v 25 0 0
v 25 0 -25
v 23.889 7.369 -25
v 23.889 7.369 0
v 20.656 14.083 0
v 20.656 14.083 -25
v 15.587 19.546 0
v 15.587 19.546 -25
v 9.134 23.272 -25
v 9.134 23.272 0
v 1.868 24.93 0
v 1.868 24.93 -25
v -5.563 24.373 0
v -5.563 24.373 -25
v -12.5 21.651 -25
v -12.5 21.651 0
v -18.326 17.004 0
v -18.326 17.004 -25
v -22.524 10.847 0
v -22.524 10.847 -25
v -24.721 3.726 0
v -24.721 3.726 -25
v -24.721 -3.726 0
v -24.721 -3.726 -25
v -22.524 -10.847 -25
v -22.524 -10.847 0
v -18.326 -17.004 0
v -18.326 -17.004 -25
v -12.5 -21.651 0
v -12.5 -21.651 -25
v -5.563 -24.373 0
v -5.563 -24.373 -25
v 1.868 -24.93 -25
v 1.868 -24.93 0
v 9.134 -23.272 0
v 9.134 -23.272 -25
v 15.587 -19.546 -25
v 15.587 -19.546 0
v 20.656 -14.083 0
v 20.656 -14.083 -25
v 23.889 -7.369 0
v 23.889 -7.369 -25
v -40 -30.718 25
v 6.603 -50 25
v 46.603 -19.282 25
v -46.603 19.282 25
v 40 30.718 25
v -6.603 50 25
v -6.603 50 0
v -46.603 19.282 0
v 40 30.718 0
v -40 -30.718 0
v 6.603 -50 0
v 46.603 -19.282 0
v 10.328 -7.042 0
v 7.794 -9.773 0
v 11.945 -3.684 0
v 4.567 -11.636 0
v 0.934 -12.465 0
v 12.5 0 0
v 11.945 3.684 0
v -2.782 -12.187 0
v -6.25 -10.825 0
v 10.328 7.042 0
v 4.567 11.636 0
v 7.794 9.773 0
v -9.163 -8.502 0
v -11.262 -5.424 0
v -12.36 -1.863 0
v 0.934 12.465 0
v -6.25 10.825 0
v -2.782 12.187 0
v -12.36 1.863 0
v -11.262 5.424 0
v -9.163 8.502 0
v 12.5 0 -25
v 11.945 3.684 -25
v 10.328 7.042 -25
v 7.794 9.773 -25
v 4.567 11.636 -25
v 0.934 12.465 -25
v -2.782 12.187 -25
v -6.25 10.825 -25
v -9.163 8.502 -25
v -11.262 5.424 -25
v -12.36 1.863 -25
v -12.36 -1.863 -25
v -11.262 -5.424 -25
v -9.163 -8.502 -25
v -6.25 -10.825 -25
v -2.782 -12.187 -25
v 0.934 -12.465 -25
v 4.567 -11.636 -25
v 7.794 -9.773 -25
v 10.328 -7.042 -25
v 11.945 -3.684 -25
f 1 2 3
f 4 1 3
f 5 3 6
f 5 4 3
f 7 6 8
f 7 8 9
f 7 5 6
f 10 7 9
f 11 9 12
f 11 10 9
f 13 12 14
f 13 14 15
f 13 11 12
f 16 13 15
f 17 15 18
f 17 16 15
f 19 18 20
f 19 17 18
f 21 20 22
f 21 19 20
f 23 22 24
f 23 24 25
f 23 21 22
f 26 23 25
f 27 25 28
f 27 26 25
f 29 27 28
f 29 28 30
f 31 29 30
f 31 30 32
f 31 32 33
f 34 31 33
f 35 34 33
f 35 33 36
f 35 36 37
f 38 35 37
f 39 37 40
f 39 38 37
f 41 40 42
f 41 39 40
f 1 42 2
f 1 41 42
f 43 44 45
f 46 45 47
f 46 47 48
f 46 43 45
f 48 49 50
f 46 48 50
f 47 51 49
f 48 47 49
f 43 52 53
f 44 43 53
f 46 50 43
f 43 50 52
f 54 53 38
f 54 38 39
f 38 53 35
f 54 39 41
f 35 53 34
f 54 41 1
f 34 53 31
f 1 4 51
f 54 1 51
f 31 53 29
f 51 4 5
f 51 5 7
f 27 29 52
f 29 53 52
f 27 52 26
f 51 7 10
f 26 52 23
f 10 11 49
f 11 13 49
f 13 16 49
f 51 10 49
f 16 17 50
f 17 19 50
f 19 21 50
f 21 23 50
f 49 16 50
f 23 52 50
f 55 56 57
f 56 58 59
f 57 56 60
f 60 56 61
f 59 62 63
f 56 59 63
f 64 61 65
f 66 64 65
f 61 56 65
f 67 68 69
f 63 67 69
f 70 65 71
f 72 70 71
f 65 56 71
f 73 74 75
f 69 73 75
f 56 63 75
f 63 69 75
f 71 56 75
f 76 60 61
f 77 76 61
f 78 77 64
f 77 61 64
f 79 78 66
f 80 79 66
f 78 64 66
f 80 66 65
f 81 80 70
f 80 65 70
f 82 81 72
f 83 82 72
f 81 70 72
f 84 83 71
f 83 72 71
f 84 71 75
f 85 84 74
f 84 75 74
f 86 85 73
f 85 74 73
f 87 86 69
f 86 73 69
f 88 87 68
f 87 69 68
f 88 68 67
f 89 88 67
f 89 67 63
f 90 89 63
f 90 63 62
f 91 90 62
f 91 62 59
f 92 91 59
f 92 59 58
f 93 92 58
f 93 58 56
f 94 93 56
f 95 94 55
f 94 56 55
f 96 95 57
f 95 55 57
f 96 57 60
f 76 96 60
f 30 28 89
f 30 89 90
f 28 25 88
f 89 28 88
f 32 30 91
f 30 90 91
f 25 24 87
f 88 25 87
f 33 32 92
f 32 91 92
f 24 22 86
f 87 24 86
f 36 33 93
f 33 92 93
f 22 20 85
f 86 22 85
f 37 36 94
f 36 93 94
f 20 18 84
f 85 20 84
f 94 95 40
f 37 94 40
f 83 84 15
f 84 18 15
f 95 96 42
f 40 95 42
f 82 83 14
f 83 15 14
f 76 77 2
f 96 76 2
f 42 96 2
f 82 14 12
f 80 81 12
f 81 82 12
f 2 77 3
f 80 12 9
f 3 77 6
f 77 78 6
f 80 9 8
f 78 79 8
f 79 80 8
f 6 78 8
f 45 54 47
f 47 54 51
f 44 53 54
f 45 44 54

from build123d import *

# Parameters (mm, degrees)
BOSS_EXTRU_1_DEPTH = 25
ESQUISSE2_R        = 25
ESQUISSE2_R_2      = 12.5
BOSS_EXTRU_2_DEPTH = 25


with BuildPart() as part:
    # Esquisse1 → Boss.-Extru.1 (new body)
    with BuildSketch(Plane(origin=(0, 0, 0), x_dir=(0, 1, 0), z_dir=(0, 0, 1))):
        Polygon((19.282032303, 46.602540378), (-30.717967697, 40), (-50, -6.602540378), (-19.282032303, -46.602540378), (30.717967697, -40), (50, 6.602540378), align=None)
    extrude(amount=BOSS_EXTRU_1_DEPTH)

    # Esquisse2 → Boss.-Extru.2 (add)
    with BuildSketch(Plane(origin=(0, 0, 0), x_dir=(0, 1, 0), z_dir=(0, 0, 1))):
        with Locations(Location((0, 0, 0), (0, 0, 270))):
            Circle(ESQUISSE2_R)
        with Locations(Location((0, 0, 0), (0, 0, 270))):
            Circle(ESQUISSE2_R_2, mode=Mode.SUBTRACT)
    extrude(amount=-BOSS_EXTRU_2_DEPTH)


solid = part.part
